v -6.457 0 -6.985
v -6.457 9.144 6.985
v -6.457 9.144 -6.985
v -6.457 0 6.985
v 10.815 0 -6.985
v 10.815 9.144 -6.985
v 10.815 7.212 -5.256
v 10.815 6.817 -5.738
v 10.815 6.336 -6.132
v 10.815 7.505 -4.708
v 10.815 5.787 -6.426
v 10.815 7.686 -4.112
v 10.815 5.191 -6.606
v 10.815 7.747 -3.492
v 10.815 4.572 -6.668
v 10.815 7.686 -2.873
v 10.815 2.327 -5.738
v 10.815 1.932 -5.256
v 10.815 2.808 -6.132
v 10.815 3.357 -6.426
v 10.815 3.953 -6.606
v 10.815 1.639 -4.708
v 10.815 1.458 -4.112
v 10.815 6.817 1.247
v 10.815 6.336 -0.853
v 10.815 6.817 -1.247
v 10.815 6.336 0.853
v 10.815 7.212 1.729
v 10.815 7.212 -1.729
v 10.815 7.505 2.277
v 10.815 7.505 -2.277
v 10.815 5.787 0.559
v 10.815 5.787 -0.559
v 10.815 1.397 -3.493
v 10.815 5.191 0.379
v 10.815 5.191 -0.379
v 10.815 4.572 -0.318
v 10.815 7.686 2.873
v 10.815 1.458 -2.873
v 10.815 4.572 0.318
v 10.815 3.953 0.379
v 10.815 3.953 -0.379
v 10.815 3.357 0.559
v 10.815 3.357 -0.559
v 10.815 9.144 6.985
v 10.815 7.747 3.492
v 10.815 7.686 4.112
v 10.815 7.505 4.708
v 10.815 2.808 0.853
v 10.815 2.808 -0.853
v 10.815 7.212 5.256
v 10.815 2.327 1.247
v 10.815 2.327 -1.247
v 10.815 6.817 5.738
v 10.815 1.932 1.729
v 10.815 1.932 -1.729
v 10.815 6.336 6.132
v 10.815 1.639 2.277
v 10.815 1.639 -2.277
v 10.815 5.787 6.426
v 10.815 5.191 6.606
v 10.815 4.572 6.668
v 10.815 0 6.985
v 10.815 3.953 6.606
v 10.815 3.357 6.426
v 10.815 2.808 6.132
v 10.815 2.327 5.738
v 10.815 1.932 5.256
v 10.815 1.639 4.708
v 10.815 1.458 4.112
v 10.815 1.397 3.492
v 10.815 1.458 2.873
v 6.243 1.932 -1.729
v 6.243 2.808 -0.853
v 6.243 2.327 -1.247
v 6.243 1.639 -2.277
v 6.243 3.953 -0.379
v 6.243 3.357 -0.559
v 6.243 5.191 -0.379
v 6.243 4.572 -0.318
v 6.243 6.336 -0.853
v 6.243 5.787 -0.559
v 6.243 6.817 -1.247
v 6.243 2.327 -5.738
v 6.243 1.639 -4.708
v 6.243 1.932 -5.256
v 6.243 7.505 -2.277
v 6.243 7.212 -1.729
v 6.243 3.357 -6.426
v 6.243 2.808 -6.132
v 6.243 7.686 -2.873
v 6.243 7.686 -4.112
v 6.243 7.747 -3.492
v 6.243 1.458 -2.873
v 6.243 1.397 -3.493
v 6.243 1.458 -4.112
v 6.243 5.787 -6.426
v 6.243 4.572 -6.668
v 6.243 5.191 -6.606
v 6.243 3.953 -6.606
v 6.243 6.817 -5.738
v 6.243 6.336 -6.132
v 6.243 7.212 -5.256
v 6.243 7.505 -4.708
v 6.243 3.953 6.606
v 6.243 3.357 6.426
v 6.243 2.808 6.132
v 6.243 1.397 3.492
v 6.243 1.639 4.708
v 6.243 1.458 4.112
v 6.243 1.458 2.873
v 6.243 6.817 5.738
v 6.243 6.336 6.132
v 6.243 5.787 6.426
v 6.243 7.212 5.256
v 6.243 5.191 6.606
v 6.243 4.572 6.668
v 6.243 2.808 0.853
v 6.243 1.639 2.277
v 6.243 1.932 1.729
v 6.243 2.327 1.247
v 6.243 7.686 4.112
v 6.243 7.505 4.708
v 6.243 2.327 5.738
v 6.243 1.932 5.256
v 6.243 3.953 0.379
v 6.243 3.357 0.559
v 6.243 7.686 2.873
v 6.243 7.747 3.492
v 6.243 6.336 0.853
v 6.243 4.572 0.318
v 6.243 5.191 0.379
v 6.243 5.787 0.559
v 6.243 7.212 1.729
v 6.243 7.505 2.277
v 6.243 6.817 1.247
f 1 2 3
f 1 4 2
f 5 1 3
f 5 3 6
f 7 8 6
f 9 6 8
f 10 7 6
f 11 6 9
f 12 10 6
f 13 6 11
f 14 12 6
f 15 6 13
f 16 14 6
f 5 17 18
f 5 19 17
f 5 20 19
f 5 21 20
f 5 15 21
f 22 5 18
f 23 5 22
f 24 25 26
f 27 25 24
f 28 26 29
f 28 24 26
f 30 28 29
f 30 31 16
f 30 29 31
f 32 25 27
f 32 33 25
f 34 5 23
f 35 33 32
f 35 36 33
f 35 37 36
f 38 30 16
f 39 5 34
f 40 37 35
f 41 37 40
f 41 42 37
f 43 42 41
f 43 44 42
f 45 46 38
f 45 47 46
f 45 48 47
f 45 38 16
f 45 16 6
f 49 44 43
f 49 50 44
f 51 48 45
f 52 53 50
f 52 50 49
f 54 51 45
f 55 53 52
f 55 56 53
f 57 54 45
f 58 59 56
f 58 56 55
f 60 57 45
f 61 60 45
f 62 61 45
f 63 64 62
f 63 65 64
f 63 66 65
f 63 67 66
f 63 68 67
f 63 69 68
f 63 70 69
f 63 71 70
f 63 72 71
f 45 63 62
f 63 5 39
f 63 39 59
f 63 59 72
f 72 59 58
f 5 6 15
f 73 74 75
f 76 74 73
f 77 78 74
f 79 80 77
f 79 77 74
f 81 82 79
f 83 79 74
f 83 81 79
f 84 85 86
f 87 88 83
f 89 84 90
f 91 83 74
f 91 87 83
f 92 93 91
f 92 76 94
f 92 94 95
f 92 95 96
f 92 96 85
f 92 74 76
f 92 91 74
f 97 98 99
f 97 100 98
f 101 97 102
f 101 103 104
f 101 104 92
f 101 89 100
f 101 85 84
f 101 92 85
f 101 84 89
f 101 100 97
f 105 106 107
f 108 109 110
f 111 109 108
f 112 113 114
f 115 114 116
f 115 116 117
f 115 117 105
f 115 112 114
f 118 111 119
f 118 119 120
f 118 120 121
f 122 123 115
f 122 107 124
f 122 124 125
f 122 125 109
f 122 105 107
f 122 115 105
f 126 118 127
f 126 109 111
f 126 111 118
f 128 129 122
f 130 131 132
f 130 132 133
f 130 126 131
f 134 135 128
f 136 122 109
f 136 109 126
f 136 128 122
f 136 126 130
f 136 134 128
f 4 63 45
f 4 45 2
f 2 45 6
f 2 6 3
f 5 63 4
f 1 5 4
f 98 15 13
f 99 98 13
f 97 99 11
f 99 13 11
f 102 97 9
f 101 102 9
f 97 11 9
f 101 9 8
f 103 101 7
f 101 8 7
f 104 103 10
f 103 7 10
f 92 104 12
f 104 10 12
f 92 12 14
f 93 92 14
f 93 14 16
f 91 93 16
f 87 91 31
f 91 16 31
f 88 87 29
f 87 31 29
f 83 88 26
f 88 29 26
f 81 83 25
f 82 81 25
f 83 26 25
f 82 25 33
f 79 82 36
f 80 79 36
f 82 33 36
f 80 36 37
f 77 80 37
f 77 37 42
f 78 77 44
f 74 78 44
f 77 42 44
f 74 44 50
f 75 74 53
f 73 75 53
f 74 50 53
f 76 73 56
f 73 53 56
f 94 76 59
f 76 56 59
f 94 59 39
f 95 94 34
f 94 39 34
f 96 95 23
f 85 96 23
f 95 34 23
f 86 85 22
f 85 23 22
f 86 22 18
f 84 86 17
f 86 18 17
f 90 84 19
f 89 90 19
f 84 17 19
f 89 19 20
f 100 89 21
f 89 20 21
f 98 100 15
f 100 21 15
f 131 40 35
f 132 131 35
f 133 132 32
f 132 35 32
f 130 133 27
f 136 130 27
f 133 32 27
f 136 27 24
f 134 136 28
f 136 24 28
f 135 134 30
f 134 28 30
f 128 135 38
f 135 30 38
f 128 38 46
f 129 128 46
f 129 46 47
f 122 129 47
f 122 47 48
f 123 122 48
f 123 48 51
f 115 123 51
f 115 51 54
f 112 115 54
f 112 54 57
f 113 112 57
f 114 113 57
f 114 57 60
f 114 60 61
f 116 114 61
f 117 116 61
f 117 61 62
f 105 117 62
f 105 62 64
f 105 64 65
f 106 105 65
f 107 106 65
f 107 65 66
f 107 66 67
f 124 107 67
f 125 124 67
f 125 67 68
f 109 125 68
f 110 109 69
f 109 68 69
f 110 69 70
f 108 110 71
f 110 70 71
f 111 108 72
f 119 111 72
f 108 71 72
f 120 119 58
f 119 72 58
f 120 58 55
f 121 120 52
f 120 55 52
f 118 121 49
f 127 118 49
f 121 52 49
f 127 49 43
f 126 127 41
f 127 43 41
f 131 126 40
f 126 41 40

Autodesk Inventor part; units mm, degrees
ref_plane "YZ Plane" through (0, 0, 0) normal (1, 0, 0) x (0, 1, 0)
ref_plane "XZ Plane" through (0, 0, 0) normal (0, 1, 0) x (-1, 0, 0)
ref_plane "XY Plane" through (0, 0, 0) normal (0, 0, 1) x (1, 0, 0)
sketch "Sketch1" plane through (0, 0, 0) normal (0, 1, 0) x (-1, 0, 0)
  line L0 (-10.8149, 6.985) -> (6.4571, 6.985)
  line L1 (6.4571, 6.985) -> (6.4571, -6.985)
  line L2 (6.4571, -6.985) -> (-10.8149, -6.985)
  line L3 (-10.8149, -6.985) -> (-10.8149, 6.985)
  point P0 (0, 0)
  dimension "d0" = 13.97
  dimension "d1" = 17.272
  dimension "d2" = 6.985
extrude "Extrusion1" add sketch "Sketch1" along normal blind 9.144
sketch "Sketch3" plane through (10.8149, 0, 6.985) normal (1, 0, 0) x (0, 0, -1)
  line L0 (13.97, 0) -> (13.97, 9.144) projected
  line L1 (0, 0) -> (0, 9.144) projected
  circle A0 centre (3.4925, 4.572) radius 3.175
  circle A1 centre (10.4775, 4.572) radius 3.175
  point P0 (6.985, 0)
  dimension "d6" = 6.35
  dimension "d7" = 6.35
  dimension "d8" = 3.4925
  dimension "d9" = 3.4925
extrude "Extrusion2" cut sketch "Sketch3" against normal blind 4.572
properties part number "TE_2Pin"
